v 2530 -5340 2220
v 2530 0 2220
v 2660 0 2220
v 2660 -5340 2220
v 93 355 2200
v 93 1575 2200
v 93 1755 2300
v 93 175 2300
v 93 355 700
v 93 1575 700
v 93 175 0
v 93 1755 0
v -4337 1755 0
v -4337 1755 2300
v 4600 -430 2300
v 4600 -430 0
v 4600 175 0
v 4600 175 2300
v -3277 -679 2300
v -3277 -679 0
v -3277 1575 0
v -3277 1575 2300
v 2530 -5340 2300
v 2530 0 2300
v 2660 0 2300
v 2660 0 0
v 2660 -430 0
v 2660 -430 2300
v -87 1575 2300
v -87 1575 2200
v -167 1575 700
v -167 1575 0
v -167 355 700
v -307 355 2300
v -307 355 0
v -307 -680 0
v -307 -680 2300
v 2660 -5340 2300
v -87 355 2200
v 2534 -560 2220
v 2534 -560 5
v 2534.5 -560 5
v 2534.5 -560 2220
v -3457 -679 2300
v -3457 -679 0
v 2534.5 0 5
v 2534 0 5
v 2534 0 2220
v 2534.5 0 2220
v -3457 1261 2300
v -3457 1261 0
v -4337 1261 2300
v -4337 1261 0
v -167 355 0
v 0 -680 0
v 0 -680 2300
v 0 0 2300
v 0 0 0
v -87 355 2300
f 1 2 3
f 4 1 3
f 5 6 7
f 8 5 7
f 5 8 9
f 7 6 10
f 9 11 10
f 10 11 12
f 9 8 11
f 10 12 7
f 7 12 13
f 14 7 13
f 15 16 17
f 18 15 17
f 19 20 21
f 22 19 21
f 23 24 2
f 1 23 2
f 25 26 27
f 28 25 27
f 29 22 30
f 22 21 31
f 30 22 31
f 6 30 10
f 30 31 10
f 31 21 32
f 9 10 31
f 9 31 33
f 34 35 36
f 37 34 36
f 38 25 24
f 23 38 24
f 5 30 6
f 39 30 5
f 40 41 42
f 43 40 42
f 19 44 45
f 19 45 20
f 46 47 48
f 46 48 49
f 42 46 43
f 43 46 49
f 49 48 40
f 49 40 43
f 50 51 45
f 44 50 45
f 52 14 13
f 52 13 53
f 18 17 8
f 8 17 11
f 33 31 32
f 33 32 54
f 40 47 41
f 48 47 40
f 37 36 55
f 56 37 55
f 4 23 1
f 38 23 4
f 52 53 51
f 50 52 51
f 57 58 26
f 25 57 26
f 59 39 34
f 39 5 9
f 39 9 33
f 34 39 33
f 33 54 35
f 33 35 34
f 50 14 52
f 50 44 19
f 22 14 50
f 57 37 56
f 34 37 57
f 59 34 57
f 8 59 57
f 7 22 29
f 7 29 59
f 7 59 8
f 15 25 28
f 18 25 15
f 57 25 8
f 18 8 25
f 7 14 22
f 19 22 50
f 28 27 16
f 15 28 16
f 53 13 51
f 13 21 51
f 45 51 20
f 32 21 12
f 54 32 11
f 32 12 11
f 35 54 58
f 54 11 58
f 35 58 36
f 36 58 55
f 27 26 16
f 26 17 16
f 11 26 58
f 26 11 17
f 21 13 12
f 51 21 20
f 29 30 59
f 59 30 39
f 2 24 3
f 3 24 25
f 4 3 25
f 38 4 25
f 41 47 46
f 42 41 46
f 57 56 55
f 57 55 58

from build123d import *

# Parameters (mm, degrees)
F1_DEPTH = 2300
F2_W     = 1220
F2_H     = 700
F3_DEPTH = 80
F2_H_2   = 1500
F4_DEPTH = 4687.001
F6_DEPTH = 5340
F5_W     = 0.5
F5_H     = 2215
F7_DEPTH = 560


with BuildPart() as f1:
    # F0 (on Top) → F1 (new body)
    with BuildSketch(Plane.XY):
        Polygon((-87, 355), (-307, 355), (-307, -680), (0, -680), (0, 0), (2660, 0), (2660, -430), (4600, -430), (4600, 175), (93, 175), (93, 1755), (-4337, 1755), (-4337, 1261), (-3457, 1261), (-3457, -679), (-3277, -679), (-3277, 1575), (-87, 1575), align=None)
    extrude(amount=F1_DEPTH)

    # F2 (on face) → F3 (join)
    with BuildSketch(Plane(origin=(-87, 0, 0), x_dir=(0, -1, 0), z_dir=(-1, 0, 0))):
        with Locations((-965, 350)):
            Rectangle(F2_W, F2_H)
    extrude(amount=F3_DEPTH)

    # F2 (on face) → F4 (cut, through all)
    with BuildSketch(Plane(origin=(-87, 0, 0), x_dir=(0, -1, 0), z_dir=(-1, 0, 0))):
        with Locations((-965, 1450)):
            Rectangle(F2_W, F2_H_2)
    extrude(amount=-F4_DEPTH, mode=Mode.SUBTRACT)


with BuildPart() as f6:
    # F5 (on face) → F6 (new body)
    with BuildSketch(Plane.XZ):
        Polygon((2660, 2220), (2660, 2300), (2530, 2300), (2530, 2220), (2534, 2220), (2534.5, 2220), align=None)
    extrude(amount=F6_DEPTH)


with BuildPart() as f7:
    # F5 (on face) → F7 (new body)
    with BuildSketch(Plane.XZ):
        with Locations((2534.25, 1112.5)):
            Rectangle(F5_W, F5_H)
    extrude(amount=F7_DEPTH)


solid = Compound([f1.part, f6.part, f7.part])
